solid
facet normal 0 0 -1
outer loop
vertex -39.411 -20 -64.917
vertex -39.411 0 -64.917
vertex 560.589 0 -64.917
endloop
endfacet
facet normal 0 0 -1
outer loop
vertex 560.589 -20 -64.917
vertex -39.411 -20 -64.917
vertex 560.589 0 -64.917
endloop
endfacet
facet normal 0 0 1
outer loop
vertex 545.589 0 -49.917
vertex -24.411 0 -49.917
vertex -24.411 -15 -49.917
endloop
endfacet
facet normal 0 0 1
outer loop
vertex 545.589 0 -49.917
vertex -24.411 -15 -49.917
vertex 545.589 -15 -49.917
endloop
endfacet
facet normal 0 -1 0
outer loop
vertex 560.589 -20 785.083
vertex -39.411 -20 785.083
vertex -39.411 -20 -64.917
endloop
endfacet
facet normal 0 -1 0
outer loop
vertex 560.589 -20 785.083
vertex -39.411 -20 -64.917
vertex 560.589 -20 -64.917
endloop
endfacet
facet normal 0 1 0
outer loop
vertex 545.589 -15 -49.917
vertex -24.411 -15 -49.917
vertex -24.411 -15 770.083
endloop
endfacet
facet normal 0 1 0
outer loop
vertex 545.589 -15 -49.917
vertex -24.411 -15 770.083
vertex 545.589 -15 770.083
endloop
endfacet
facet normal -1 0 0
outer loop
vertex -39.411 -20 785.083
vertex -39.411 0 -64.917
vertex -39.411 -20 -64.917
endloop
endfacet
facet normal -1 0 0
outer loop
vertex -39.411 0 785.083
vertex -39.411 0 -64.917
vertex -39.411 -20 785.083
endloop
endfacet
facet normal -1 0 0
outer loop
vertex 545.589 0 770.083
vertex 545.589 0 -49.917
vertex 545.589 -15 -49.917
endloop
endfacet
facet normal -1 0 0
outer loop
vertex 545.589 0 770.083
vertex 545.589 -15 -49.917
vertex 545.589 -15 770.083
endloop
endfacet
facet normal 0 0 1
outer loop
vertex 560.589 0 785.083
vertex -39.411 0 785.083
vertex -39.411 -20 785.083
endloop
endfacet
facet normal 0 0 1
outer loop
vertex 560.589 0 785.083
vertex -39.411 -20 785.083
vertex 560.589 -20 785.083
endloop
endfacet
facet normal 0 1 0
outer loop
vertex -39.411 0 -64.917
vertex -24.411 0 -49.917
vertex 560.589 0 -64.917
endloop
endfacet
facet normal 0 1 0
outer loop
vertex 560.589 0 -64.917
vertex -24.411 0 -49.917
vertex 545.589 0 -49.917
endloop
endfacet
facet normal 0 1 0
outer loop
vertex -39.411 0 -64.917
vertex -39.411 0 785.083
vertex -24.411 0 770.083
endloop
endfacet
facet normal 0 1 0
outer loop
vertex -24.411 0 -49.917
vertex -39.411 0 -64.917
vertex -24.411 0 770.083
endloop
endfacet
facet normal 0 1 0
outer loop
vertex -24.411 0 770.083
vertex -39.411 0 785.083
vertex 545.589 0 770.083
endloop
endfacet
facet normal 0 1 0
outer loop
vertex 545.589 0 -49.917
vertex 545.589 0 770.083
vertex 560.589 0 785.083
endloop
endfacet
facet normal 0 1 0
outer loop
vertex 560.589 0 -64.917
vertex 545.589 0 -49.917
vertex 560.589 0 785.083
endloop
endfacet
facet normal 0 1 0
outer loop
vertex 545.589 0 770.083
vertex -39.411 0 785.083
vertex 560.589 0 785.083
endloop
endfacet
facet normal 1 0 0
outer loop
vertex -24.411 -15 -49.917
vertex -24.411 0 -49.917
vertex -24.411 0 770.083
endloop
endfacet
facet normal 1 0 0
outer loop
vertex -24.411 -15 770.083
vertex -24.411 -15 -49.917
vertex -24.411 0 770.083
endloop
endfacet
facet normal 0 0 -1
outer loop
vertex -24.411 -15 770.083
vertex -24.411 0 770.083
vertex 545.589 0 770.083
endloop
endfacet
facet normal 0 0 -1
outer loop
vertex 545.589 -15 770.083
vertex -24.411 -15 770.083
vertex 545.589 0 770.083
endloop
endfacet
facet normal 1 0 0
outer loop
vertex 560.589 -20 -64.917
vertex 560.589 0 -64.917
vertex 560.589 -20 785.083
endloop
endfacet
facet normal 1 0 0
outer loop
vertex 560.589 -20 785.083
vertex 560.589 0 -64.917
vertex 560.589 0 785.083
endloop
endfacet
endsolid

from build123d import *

# Parameters (mm, degrees)
F0_W     = 600
F0_H     = 850
F0_W_2   = 570
F0_H_2   = 820
F1_DEPTH = 20
F2_W     = 600
F2_H     = 850
F3_DEPTH = 5


with BuildPart() as f1:
    # F0 (on Front) → F1 (new body)
    with BuildSketch(Plane.XZ):
        with Locations((260.588973, 360.083479)):
            Rectangle(F0_W, F0_H)
        with Locations((260.588973, 360.083479)):
            Rectangle(F0_W_2, F0_H_2, mode=Mode.SUBTRACT)
    extrude(amount=F1_DEPTH)

    # F2 (on face) → F3 (join)
    with BuildSketch(Plane.XZ.offset(20)):
        with Locations((260.588973, 360.083479)):
            Rectangle(F2_W, F2_H)
    extrude(amount=-F3_DEPTH)


solid = f1.part
